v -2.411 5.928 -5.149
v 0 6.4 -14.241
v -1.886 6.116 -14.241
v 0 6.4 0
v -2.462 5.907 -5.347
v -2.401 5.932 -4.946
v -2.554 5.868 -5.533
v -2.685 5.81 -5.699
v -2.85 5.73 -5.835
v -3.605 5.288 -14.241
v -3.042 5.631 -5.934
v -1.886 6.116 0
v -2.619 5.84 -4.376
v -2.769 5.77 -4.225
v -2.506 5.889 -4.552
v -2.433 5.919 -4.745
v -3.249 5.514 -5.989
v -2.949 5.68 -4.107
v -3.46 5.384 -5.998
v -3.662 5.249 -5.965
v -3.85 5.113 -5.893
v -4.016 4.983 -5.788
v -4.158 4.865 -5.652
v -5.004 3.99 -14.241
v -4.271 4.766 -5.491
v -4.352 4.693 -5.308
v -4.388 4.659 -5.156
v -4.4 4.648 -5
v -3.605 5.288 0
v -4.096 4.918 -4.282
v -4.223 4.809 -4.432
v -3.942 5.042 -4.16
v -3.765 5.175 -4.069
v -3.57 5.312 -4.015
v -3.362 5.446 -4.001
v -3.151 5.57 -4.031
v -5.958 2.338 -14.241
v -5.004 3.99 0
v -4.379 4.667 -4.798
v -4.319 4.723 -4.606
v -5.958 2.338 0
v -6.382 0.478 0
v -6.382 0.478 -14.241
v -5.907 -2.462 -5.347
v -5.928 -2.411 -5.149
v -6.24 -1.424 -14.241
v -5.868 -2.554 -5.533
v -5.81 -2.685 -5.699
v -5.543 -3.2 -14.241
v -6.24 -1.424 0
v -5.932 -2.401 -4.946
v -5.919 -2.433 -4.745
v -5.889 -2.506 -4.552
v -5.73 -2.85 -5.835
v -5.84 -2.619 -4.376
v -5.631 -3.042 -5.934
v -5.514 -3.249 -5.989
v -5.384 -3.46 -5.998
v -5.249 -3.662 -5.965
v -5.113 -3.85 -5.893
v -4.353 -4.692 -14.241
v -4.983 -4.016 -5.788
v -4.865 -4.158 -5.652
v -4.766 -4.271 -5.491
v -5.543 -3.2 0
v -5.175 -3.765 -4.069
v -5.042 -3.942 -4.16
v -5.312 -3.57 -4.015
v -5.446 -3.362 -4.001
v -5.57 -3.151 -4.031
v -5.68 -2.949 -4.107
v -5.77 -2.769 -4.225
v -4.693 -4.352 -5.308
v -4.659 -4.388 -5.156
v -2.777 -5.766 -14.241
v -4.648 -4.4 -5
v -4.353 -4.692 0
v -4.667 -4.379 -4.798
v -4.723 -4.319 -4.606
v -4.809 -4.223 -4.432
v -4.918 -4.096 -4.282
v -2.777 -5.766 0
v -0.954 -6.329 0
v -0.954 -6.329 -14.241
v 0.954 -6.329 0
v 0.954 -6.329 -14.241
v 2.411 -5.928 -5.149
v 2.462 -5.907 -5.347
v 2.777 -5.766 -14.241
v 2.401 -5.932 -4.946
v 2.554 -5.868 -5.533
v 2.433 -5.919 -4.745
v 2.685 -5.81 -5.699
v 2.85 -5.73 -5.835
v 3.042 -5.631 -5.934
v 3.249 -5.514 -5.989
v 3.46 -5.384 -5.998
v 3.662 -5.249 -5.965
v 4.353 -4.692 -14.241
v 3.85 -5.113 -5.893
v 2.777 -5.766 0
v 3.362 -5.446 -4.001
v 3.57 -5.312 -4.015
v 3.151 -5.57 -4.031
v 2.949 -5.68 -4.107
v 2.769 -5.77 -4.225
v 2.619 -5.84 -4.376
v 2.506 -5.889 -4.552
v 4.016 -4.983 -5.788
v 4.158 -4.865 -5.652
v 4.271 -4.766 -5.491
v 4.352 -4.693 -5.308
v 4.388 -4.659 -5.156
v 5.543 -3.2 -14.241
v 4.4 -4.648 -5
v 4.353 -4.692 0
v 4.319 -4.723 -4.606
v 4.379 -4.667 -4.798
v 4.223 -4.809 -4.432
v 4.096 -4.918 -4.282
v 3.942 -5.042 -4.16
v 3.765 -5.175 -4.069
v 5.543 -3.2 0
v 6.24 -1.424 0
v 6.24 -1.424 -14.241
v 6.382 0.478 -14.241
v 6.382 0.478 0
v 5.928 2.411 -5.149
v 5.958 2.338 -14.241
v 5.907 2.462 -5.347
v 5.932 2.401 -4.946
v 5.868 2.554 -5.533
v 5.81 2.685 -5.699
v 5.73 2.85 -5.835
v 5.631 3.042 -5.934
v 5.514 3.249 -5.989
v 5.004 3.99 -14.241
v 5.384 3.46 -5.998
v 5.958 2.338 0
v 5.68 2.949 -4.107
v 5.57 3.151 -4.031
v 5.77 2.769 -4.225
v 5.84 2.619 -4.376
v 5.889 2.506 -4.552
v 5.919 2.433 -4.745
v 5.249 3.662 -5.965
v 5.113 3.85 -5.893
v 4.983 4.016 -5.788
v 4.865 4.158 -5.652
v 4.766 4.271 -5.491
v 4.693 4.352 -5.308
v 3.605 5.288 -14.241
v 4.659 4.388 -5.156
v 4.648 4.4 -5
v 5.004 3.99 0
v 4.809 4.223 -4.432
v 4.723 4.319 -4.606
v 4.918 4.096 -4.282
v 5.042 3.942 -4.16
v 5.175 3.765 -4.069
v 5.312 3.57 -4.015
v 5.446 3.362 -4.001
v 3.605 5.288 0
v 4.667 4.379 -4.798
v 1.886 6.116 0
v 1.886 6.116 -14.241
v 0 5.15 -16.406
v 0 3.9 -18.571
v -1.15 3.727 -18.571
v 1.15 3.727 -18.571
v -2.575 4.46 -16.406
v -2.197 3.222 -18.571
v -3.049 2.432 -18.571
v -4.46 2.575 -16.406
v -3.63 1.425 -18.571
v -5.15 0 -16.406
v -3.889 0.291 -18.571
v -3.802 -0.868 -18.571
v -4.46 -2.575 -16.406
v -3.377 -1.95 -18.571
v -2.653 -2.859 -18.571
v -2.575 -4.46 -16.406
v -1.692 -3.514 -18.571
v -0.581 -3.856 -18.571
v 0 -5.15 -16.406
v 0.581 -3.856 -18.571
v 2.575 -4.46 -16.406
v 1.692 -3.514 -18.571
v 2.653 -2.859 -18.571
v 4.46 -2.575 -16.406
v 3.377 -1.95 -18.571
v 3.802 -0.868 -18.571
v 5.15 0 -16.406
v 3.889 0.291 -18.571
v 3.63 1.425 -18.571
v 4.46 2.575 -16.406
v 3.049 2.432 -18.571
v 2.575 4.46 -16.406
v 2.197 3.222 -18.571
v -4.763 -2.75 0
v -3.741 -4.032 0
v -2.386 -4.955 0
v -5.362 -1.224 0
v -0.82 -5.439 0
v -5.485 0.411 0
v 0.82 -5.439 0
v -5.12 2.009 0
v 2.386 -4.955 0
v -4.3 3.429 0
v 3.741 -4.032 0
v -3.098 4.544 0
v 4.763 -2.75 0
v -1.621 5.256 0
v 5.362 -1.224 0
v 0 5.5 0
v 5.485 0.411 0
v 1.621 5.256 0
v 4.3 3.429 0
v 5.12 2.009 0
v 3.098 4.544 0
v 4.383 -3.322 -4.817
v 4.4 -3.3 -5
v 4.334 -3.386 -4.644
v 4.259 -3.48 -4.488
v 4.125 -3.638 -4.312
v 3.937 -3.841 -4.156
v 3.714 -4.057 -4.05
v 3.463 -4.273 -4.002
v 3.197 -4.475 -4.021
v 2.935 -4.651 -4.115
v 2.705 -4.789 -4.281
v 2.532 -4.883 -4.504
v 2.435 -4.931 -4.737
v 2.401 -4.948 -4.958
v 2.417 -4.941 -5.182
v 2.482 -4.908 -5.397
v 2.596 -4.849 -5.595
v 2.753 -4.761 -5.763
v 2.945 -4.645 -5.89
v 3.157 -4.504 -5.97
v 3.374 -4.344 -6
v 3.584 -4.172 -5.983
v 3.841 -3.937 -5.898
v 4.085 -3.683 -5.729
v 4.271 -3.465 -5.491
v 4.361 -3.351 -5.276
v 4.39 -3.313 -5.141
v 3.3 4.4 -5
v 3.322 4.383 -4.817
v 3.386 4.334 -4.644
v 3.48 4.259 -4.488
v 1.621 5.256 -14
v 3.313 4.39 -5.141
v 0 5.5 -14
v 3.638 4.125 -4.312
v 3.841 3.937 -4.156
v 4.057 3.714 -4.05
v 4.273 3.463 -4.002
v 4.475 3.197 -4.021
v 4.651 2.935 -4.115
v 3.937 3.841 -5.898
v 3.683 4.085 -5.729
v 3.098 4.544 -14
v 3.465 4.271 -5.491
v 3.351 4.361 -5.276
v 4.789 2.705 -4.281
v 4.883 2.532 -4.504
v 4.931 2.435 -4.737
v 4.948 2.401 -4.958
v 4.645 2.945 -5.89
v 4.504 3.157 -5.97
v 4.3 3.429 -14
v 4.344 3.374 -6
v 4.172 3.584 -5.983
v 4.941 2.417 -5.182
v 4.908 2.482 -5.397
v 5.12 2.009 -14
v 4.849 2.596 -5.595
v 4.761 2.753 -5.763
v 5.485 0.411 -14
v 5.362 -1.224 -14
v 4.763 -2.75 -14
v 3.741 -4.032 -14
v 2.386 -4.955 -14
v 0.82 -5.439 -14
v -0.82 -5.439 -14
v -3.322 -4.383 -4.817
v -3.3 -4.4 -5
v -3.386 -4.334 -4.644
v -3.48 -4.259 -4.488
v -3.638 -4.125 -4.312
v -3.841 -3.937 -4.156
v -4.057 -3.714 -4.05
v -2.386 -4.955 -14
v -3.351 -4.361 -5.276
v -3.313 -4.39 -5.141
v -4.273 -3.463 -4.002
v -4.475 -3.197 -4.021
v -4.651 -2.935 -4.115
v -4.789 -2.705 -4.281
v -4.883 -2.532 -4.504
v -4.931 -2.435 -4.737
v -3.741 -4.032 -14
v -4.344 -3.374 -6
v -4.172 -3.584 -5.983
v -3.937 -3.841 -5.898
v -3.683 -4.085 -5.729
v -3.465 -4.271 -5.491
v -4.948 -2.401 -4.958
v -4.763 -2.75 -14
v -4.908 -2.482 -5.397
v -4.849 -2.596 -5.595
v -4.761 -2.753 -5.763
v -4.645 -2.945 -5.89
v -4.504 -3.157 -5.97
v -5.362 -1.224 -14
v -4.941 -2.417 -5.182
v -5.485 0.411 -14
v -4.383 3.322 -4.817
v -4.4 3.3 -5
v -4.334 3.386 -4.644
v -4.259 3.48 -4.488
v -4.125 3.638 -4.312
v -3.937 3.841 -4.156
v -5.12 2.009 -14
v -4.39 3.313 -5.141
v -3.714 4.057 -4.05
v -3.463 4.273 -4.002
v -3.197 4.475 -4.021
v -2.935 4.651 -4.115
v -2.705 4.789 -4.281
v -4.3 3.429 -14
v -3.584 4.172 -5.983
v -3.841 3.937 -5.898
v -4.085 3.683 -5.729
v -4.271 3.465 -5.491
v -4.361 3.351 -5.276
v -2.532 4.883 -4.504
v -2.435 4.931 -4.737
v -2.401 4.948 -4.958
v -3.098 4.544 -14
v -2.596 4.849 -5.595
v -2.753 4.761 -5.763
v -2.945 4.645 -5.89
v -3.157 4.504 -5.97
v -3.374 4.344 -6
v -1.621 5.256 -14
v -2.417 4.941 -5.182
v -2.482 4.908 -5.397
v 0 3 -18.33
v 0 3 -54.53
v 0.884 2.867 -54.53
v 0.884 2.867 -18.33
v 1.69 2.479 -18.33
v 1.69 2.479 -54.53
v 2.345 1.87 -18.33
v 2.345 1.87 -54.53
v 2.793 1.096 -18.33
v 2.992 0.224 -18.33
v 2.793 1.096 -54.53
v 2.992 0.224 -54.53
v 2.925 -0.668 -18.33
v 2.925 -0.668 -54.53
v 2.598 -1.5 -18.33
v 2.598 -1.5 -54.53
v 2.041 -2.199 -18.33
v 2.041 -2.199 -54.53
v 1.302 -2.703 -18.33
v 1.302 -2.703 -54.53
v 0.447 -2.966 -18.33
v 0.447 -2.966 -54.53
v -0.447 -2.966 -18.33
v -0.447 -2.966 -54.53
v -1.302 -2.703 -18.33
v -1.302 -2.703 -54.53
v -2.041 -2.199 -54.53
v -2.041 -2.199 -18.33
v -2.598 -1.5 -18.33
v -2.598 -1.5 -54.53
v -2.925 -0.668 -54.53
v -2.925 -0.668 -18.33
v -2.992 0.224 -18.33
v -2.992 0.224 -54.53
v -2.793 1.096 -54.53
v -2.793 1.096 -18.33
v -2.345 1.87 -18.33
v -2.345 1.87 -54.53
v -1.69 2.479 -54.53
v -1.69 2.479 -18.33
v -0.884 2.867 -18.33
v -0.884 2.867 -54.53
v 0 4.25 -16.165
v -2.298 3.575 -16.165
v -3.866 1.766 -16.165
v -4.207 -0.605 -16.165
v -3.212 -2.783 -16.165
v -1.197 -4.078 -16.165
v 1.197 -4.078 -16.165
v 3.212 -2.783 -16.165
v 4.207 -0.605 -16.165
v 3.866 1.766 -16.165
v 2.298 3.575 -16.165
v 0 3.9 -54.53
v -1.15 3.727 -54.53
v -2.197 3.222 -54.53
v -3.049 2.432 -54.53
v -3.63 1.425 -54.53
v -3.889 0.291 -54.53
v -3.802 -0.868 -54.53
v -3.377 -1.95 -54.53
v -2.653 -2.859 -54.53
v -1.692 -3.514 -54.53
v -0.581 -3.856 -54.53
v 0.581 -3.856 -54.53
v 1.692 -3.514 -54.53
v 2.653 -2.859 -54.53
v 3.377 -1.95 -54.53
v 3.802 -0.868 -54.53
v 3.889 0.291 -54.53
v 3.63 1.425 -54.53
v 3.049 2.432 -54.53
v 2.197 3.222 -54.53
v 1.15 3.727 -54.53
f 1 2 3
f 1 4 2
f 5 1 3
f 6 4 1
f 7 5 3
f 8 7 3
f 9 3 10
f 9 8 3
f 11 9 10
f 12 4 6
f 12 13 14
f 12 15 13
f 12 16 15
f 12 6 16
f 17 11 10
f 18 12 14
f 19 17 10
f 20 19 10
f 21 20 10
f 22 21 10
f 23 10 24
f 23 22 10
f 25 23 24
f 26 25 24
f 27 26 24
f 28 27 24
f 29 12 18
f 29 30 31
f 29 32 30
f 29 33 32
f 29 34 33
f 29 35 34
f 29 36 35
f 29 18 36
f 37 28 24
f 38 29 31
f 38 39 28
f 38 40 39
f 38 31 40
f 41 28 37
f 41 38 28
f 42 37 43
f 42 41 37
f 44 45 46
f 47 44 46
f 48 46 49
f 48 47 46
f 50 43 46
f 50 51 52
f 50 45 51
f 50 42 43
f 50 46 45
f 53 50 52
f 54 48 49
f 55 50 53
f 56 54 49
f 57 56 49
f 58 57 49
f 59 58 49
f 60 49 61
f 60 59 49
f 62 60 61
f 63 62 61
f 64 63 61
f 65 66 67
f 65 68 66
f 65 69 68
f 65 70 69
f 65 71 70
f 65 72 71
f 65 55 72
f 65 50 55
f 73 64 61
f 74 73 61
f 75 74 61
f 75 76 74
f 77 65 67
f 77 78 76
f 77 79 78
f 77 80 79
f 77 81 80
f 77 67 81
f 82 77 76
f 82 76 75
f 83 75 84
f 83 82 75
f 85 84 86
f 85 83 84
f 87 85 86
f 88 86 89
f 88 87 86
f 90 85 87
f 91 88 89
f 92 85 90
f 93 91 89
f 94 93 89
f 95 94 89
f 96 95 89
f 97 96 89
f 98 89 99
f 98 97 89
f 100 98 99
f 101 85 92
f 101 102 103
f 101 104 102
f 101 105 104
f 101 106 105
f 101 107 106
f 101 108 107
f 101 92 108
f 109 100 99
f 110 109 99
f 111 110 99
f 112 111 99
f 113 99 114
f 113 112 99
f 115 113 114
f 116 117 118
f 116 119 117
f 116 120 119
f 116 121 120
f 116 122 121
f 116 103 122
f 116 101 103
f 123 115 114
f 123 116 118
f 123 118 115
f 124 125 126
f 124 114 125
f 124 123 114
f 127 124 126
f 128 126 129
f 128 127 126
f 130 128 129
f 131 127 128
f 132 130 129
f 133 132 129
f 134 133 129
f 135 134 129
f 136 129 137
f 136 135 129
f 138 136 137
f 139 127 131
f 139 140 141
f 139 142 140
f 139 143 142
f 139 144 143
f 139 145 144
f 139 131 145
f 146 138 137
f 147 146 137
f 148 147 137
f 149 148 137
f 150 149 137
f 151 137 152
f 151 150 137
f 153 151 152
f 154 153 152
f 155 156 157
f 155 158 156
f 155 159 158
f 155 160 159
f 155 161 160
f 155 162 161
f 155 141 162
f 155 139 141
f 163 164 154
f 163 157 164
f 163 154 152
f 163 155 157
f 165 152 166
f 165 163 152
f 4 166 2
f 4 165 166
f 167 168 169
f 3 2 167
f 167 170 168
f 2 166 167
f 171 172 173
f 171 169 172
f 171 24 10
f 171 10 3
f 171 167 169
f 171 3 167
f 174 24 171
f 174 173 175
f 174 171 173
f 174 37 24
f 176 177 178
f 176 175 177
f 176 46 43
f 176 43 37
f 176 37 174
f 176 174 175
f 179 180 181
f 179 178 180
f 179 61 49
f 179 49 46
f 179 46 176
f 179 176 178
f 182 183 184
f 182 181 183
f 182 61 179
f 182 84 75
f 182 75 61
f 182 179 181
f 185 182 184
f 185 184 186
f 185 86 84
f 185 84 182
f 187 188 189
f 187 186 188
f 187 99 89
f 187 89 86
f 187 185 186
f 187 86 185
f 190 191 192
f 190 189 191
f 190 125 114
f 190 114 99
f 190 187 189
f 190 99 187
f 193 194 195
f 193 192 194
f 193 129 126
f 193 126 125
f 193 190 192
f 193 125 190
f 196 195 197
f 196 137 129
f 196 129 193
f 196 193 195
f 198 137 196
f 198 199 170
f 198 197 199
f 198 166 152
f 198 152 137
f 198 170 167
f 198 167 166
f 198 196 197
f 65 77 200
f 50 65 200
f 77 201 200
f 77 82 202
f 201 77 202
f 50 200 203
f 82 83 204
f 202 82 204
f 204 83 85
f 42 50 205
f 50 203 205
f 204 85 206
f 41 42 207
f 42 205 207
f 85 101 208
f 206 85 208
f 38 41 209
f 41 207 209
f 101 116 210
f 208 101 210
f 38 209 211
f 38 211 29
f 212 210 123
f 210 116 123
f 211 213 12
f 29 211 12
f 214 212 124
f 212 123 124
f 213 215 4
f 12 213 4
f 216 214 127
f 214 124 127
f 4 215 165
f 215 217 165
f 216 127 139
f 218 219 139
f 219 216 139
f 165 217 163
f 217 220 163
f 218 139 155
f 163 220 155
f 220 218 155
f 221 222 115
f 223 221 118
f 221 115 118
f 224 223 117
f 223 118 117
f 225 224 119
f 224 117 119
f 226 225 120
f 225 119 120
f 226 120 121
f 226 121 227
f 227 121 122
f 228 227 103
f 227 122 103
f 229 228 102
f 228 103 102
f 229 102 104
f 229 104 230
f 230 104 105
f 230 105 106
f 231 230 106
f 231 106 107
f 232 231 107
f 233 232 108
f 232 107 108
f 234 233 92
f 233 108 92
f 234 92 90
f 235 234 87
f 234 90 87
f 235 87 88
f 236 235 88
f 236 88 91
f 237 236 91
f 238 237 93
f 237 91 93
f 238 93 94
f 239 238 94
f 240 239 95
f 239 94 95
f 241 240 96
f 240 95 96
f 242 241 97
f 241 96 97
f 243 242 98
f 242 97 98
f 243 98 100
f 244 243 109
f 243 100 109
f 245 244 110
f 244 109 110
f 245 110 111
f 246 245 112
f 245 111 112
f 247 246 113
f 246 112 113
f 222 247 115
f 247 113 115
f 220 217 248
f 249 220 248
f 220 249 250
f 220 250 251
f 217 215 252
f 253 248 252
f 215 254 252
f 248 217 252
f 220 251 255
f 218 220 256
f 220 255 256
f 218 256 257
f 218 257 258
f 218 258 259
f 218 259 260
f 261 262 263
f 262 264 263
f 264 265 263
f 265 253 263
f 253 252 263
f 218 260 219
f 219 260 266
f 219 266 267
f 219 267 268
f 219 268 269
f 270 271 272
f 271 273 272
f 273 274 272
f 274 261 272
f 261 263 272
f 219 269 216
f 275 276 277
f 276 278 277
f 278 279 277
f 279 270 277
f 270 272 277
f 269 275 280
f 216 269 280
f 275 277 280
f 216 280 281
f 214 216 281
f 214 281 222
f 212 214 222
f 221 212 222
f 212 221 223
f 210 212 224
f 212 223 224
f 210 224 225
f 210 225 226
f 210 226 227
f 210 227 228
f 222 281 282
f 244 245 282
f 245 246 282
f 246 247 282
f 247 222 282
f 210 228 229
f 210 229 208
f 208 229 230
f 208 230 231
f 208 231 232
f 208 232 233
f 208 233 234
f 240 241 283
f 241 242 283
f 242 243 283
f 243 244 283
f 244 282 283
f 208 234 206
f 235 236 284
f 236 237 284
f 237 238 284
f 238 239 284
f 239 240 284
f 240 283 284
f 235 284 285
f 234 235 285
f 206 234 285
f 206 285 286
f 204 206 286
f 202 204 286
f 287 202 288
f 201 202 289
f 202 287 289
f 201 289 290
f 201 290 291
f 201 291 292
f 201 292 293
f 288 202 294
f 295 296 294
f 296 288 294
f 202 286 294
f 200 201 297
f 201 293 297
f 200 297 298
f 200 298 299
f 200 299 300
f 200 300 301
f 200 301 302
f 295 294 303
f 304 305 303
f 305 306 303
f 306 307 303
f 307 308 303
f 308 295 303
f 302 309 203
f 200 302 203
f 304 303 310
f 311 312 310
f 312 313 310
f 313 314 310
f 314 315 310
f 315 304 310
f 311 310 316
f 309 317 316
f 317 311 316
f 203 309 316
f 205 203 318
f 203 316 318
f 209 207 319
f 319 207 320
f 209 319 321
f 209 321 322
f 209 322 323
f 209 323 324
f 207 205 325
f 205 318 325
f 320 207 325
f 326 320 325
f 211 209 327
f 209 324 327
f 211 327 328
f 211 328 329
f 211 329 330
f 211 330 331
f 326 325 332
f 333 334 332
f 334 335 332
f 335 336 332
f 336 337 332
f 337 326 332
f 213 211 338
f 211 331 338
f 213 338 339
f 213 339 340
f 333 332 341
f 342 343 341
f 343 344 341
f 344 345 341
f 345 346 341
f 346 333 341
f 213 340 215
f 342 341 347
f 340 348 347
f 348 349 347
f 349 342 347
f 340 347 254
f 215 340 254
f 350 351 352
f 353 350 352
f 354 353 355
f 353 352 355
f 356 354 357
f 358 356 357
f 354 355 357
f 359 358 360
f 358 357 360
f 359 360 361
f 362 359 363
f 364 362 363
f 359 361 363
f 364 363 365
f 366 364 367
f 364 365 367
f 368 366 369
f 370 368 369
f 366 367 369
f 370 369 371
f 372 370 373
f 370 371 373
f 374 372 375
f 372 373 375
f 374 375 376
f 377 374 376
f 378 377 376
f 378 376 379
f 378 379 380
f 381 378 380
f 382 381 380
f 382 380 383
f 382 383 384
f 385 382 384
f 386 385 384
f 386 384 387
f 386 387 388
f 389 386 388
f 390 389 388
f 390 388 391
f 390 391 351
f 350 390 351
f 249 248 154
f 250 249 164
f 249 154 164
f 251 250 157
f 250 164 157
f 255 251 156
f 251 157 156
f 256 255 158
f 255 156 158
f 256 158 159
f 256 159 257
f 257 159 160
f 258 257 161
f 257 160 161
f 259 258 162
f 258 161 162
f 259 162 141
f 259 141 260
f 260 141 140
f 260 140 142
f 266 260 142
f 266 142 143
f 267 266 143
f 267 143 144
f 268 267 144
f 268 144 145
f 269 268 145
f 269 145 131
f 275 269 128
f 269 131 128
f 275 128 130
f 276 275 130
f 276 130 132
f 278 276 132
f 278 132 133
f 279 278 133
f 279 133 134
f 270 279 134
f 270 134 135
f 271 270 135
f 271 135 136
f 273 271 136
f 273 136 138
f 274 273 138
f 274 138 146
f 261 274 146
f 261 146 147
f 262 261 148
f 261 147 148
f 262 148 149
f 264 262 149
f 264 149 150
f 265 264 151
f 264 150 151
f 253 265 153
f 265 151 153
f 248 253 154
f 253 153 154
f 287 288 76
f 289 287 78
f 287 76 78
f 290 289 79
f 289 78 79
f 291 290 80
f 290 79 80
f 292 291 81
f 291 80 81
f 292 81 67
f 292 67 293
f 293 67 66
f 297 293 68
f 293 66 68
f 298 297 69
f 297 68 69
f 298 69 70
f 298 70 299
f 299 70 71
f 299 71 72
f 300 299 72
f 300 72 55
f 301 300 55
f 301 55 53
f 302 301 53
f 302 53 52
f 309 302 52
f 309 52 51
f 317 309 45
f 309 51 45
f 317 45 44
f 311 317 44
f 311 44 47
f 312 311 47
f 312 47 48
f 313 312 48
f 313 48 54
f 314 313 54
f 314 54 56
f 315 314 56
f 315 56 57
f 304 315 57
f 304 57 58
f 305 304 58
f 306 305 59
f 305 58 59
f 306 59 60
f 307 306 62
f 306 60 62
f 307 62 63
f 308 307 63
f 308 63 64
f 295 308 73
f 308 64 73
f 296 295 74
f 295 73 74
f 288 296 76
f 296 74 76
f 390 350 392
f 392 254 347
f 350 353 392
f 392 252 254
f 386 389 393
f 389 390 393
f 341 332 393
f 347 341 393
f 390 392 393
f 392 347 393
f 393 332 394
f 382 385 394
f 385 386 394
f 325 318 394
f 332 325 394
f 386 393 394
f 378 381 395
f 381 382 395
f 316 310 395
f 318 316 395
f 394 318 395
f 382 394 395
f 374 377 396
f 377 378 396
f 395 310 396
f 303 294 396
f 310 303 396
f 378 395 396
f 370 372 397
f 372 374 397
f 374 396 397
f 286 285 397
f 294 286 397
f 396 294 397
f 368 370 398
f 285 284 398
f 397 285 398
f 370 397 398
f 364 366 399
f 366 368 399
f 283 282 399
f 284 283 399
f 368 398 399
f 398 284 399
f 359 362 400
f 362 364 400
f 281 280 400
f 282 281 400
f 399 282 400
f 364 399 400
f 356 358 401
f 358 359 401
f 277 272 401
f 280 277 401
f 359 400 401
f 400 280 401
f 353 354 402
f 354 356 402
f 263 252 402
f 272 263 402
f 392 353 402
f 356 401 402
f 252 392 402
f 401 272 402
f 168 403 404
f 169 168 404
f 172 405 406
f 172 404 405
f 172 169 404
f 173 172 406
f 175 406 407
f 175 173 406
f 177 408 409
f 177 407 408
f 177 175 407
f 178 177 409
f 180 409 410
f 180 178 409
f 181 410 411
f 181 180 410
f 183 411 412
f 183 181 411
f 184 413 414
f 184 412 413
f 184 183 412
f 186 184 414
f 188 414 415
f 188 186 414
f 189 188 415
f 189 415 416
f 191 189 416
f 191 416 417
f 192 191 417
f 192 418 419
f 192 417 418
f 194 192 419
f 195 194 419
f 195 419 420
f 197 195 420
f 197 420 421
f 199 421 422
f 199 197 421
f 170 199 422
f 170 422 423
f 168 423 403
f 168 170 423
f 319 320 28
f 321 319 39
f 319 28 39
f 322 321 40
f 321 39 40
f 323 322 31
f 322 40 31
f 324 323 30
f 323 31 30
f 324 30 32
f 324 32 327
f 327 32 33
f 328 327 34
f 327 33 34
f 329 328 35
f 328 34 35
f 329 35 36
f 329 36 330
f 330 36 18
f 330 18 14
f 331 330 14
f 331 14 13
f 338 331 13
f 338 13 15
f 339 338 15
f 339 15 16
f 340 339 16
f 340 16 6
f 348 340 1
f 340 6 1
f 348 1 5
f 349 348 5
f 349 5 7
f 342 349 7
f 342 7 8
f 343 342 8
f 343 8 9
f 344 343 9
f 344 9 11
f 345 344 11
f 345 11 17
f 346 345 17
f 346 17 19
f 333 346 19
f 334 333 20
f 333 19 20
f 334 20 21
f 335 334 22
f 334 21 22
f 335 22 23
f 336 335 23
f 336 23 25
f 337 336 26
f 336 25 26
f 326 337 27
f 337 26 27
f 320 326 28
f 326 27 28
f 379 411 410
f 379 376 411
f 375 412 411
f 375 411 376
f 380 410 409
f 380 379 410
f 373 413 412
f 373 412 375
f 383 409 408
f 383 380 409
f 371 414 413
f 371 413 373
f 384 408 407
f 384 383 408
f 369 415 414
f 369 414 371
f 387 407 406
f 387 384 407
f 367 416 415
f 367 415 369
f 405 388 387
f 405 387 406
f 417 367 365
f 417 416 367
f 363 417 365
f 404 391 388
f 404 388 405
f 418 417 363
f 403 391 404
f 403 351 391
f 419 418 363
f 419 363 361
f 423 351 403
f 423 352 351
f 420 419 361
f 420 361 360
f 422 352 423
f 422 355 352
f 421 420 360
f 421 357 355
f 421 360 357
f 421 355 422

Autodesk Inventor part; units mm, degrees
ref_plane "XZ Plane" through (0, 0, 0) normal (0, 1, 0) x (-1, 0, 0)
ref_plane "XY Plane" through (0, 0, 0) normal (0, 0, 1) x (1, 0, 0)
sketch "Sketch1" plane through (0, 0, 0) normal (1, 0, 0) x (0, 1, 0)
  line L0 (5.5, 0) -> (5.5, -14)
  line L1 (3, -18.3301) -> (3, -54.5301)
  line L2 (5.5, -14) -> (3, -18.3301)
  line L3 (6.4, -14.2412) -> (6.4, 0)
  line L4 (3.9, -54.5301) -> (3.9, -18.5713)
  line L5 (3.9, -18.5713) -> (6.4, -14.2412)
  line L6 (5.5, 0) -> (6.4, 0)
  line L7 (3, -54.5301) -> (3.9, -54.5301)
  line L8 (0, 0) -> (0, -13.4329) construction
  dimension "d7" = 5.5
  dimension "d8" = 3
  dimension "d9" = 150
  dimension "d10" = 0.9
  dimension "d11" = 0.9
  dimension "d12" = 0.9
  dimension "d13" = 14
  dimension "d14" = 36.2
revolve "Revolution1" add sketch "Sketch1" angle 360 about axis through (0, 0, 0) along (0, 0, -1)
ref_plane "Work Plane2" through (7, 0, 0) normal (1, 0, 0) x (0, 1, 0)
sketch "Sketch2" plane through (7, 0, 0) normal (1, 0, 0) x (0, 1, 0)
  line L0 (0, 0) -> (0, -5) construction
  line L1 (0, -5) -> (3.4, -5) construction
  circle A0 centre (3.4, -5) radius 1
  dimension "d18" = 5
  dimension "d19" = 3.4
  dimension "d20" = 2
extrude "Extrusion1" cut sketch "Sketch2" against normal blind 5
pattern_circular "Circular Pattern1" count 4 over 360 about axis through (0, 0, -7) along (0, 0, -1) of "Extrusion1"
properties part number "oxidizer"
